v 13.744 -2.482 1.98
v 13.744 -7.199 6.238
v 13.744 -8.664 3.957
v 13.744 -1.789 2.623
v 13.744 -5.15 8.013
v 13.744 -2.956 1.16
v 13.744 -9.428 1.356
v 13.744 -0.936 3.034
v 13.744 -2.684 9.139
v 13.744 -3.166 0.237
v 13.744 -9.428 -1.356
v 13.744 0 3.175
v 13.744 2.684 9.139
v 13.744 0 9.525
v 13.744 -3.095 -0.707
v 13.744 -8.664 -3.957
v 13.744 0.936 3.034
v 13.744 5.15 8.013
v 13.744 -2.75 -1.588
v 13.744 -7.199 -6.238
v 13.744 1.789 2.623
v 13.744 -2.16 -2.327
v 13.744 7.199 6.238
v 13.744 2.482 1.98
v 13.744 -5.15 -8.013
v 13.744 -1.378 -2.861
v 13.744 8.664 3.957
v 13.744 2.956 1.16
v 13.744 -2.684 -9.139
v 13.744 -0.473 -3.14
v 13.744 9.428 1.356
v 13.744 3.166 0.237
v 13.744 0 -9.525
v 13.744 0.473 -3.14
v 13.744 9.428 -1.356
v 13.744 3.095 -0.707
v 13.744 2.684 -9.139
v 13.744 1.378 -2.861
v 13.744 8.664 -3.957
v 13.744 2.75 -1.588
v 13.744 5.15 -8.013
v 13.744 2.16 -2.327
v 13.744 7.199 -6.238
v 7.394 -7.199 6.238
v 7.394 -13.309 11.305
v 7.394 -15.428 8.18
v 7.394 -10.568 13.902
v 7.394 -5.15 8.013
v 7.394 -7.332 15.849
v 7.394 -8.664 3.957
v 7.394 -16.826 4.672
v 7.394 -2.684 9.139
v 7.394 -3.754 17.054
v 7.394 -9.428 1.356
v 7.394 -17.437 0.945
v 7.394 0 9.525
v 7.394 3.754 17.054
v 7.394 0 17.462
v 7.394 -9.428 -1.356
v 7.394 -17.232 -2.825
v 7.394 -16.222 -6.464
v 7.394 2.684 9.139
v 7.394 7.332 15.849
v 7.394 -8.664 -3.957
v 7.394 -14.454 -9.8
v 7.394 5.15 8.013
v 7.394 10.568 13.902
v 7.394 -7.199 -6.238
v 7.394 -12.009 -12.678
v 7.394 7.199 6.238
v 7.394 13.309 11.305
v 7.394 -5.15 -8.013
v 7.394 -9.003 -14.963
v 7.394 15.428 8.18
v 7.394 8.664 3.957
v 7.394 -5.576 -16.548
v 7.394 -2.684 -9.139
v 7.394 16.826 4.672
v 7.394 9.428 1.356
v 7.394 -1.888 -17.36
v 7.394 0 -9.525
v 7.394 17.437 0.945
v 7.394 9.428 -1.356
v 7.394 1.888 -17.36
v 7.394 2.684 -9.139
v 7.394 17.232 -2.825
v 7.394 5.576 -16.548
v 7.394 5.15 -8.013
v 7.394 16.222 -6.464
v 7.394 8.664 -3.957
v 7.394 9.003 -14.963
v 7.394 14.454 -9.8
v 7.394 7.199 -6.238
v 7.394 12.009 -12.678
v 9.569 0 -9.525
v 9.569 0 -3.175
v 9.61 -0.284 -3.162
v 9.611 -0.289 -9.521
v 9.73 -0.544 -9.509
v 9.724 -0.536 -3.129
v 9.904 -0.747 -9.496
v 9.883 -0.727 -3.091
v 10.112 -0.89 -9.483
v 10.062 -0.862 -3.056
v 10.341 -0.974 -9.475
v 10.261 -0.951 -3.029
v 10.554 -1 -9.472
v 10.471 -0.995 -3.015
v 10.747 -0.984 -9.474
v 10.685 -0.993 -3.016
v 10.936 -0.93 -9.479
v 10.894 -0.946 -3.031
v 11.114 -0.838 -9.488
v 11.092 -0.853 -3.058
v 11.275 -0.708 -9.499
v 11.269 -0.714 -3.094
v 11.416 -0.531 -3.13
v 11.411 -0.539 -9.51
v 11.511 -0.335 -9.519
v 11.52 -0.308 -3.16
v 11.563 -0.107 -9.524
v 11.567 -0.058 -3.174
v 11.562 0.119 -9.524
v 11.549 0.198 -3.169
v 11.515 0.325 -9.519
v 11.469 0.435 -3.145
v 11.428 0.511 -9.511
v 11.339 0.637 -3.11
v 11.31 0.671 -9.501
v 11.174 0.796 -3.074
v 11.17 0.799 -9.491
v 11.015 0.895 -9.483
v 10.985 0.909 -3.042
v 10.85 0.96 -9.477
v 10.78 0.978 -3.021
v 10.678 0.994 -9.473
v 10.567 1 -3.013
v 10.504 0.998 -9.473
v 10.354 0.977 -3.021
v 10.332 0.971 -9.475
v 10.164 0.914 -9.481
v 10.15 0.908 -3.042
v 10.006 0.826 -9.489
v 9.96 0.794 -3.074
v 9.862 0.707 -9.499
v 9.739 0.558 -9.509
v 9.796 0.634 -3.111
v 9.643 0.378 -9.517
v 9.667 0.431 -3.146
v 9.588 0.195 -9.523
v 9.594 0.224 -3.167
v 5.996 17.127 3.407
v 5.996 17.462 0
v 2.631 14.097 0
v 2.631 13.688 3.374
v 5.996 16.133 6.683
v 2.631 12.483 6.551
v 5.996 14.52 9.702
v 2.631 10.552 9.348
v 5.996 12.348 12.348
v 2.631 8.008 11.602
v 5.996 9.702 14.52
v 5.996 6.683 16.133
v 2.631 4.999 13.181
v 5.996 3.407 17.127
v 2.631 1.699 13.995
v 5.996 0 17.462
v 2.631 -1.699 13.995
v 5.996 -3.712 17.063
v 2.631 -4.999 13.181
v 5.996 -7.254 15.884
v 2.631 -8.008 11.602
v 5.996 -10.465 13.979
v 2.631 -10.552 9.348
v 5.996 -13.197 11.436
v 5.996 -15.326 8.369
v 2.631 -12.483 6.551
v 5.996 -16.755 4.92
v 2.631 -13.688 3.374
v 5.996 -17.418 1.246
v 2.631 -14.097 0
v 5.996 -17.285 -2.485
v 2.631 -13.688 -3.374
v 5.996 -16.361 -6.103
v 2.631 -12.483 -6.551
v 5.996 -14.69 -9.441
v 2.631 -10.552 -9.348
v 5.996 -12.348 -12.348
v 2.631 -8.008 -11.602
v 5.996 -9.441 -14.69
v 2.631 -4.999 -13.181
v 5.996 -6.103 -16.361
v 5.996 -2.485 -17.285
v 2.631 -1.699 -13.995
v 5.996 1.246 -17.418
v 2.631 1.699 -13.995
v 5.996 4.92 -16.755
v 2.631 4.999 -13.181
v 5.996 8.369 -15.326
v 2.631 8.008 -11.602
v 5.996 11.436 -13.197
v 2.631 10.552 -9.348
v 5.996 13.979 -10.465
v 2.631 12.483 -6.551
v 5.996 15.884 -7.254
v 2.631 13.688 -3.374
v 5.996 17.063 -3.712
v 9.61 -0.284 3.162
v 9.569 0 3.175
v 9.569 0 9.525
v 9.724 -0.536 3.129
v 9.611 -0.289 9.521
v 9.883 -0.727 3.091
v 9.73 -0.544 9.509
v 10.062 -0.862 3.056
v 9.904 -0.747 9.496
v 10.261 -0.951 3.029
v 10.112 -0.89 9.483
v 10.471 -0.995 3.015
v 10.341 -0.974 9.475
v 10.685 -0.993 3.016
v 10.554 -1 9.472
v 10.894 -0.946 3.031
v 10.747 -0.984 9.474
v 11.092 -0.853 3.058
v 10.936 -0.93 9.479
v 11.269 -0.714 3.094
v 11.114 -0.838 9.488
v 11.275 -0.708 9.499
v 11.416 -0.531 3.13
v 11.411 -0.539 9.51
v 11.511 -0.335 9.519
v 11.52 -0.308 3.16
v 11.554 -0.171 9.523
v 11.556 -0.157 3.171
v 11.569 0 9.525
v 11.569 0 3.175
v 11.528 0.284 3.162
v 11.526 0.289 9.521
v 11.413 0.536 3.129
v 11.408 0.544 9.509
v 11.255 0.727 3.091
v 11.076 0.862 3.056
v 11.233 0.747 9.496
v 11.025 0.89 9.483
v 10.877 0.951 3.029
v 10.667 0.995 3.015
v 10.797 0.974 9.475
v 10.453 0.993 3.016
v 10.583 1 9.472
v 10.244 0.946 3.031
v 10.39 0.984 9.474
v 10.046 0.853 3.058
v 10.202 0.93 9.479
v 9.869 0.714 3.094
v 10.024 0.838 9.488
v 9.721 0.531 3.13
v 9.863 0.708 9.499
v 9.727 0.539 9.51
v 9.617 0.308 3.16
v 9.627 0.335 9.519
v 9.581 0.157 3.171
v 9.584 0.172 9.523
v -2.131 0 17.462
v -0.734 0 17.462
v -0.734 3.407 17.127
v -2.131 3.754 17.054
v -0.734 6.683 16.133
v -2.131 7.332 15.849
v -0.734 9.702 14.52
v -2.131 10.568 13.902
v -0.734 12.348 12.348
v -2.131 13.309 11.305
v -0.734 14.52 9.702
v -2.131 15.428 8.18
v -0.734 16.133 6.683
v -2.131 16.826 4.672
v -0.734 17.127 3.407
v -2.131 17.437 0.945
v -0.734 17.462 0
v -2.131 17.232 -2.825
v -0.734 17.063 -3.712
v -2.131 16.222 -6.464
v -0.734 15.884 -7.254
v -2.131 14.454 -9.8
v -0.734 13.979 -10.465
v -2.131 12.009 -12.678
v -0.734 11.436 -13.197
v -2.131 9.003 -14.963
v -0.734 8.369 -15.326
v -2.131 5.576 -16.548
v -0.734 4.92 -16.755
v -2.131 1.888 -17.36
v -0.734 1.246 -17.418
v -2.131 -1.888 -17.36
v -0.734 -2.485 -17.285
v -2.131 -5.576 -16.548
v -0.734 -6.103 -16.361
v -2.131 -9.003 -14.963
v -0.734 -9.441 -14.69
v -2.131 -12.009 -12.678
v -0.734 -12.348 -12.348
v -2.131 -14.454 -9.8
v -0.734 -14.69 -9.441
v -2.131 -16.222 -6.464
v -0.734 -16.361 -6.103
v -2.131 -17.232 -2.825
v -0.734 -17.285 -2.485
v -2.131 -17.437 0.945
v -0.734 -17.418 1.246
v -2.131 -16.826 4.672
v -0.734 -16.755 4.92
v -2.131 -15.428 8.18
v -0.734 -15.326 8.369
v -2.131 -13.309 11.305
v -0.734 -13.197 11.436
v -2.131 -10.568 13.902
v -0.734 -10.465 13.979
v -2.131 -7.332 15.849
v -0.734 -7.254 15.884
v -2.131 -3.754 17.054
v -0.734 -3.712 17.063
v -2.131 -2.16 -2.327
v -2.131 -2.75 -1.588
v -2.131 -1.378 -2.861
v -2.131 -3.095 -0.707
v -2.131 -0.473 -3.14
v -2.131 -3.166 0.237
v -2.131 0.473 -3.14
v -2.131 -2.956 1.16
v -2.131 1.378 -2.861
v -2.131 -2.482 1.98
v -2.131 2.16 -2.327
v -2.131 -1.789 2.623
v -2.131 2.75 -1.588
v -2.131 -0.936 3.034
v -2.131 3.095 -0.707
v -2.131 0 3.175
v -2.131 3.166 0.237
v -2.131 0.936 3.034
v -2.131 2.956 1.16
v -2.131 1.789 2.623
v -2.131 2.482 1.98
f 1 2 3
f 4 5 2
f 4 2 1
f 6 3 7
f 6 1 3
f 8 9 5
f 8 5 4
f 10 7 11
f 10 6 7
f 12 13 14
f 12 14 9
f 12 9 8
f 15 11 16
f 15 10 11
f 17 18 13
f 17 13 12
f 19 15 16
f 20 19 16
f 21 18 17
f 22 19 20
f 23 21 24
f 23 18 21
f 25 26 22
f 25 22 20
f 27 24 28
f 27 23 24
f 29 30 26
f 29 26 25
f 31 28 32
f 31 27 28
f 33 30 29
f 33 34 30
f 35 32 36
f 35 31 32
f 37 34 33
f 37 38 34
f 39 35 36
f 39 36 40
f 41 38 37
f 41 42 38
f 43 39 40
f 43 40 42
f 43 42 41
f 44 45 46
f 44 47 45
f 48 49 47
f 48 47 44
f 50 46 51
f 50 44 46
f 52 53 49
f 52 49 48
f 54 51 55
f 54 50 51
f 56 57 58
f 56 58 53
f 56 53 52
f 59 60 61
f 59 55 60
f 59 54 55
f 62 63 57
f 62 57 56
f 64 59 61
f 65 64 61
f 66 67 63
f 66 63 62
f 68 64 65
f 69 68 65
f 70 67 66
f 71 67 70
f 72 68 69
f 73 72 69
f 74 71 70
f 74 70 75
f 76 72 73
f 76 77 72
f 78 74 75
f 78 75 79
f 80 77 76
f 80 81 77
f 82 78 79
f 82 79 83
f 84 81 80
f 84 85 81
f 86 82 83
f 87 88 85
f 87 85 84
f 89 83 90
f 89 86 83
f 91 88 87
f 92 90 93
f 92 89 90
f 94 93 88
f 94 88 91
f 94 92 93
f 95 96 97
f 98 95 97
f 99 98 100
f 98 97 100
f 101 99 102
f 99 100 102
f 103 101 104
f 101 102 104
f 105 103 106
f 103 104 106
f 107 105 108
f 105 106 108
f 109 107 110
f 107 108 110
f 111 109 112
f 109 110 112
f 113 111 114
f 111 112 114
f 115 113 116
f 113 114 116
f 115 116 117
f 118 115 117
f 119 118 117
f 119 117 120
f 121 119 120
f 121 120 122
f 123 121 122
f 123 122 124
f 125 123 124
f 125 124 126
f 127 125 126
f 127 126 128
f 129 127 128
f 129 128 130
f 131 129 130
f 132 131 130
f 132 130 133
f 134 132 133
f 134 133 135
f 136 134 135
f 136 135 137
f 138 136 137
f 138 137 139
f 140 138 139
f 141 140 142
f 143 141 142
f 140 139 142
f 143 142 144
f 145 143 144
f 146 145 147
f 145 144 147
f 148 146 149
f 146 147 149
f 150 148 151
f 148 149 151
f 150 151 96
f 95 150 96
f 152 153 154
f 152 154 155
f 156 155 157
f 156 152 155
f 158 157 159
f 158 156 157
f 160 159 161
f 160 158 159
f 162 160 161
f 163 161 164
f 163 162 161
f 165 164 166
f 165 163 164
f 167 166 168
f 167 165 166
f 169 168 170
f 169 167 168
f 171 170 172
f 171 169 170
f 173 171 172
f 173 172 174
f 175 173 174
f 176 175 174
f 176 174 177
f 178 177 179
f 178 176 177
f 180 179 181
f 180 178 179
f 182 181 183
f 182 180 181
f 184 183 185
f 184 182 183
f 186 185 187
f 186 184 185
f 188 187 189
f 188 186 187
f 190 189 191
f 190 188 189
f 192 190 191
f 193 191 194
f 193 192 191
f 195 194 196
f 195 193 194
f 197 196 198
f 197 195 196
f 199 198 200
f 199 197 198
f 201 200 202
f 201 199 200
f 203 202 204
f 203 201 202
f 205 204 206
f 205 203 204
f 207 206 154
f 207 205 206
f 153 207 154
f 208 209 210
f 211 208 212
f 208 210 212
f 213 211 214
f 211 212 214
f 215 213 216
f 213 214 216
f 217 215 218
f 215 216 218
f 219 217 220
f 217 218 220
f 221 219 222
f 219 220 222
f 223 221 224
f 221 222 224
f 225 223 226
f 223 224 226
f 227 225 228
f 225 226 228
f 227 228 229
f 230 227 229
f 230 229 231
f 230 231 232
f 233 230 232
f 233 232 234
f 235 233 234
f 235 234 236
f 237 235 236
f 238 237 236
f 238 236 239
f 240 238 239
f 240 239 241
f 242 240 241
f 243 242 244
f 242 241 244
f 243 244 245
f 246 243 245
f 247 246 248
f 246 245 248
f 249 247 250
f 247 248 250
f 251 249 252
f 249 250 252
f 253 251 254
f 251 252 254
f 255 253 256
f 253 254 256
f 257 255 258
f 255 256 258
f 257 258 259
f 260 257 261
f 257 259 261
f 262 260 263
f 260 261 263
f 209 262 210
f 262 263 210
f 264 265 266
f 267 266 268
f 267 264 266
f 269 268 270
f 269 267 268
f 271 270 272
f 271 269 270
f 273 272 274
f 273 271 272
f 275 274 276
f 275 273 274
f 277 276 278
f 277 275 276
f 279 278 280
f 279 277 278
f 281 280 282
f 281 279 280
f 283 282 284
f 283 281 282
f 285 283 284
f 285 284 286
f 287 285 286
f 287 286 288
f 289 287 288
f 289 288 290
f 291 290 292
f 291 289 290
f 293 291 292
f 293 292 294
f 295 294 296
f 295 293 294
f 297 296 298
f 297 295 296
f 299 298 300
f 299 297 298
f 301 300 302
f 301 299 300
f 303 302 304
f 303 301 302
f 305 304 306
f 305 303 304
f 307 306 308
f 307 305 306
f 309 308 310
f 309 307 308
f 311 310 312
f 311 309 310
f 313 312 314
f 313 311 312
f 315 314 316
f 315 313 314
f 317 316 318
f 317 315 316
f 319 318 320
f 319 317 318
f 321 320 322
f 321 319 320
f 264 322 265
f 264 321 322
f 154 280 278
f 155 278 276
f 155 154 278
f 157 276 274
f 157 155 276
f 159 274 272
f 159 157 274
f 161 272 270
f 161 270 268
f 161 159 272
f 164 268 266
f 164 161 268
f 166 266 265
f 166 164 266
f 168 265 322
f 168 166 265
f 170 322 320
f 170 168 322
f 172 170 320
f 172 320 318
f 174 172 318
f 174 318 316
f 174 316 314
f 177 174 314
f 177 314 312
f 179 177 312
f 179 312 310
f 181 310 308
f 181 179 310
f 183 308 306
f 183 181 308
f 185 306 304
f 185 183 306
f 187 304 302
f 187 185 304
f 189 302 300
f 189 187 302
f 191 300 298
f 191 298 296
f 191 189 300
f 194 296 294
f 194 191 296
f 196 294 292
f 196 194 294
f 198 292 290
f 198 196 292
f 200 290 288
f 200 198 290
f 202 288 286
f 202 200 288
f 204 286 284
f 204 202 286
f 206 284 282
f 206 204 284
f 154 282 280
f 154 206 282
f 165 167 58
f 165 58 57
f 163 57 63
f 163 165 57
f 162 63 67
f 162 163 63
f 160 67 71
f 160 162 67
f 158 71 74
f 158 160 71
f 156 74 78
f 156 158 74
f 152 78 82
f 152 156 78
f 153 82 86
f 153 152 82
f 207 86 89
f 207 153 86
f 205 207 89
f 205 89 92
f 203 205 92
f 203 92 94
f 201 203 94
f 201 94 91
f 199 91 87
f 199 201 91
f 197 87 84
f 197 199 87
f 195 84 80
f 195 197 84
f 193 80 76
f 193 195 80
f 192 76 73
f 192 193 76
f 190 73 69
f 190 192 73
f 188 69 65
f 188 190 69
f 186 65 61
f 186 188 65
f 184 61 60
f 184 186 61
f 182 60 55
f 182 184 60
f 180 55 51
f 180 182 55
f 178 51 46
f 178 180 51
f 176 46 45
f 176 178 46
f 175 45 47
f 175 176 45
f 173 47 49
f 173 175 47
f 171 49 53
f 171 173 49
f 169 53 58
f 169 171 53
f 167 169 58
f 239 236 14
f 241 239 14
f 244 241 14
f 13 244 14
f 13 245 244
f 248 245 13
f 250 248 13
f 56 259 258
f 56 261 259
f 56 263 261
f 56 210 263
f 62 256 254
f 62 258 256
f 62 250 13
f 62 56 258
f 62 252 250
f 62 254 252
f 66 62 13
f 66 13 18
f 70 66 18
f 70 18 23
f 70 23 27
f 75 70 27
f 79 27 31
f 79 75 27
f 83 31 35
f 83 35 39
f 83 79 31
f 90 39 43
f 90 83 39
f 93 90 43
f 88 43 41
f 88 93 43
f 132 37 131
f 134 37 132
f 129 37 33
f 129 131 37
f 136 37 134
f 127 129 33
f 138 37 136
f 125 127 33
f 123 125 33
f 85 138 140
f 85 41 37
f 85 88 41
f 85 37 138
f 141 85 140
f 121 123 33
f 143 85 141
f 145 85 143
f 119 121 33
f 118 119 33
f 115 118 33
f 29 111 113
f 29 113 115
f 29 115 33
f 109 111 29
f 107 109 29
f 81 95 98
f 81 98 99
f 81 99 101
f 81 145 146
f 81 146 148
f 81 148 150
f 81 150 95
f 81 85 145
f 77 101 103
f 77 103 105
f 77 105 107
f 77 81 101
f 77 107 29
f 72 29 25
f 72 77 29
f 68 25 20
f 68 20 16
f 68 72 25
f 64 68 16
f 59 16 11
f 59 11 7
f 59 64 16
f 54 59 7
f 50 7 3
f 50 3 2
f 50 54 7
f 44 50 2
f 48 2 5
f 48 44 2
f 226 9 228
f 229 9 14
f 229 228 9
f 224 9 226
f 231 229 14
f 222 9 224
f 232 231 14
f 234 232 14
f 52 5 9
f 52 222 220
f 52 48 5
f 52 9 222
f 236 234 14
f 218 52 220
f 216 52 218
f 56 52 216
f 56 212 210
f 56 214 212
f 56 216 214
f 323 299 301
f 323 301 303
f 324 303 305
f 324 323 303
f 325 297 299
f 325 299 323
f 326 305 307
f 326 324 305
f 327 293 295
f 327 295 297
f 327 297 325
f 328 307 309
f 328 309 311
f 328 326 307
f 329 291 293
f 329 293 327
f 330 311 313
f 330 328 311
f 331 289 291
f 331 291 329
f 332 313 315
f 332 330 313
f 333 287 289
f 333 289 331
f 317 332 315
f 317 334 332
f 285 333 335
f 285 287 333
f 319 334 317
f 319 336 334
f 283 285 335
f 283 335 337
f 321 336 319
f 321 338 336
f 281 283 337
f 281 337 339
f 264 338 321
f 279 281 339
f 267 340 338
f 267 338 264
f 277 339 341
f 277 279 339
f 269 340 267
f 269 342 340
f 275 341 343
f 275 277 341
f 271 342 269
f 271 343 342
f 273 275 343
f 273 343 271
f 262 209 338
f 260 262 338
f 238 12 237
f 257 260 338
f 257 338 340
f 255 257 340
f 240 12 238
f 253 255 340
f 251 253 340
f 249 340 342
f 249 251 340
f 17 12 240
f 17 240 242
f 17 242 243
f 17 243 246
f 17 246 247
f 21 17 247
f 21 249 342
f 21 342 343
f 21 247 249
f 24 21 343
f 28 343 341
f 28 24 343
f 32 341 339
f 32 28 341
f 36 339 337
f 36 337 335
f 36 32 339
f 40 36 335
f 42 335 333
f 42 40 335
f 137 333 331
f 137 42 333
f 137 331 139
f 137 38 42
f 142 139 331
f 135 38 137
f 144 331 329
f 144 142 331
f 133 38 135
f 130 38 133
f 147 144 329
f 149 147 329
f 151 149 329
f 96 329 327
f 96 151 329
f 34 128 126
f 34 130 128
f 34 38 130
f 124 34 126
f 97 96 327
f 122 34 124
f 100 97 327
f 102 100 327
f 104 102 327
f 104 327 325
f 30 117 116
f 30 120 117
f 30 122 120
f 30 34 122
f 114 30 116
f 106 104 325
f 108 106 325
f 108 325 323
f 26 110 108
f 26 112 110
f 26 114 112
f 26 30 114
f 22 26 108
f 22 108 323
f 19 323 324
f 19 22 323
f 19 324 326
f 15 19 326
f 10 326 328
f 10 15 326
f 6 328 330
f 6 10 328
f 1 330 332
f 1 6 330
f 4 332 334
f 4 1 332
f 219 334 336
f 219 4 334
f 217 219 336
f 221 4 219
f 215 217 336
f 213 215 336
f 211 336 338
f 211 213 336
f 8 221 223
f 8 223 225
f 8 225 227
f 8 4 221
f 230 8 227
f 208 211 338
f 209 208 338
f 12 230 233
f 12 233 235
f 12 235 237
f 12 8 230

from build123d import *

# Parameters (mm, degrees)
F4_DEPTH = 27.0135


with BuildPart() as f1:
    # F0 (on Front) → F1 (revolve)
    with BuildSketch(Plane.XZ):
        Polygon((-2.131164, 3.175), (13.743836, 3.175), (13.743836, 9.525), (7.393836, 9.525), (7.393836, 17.4625), (-2.131164, 17.4625), align=None)
    revolve(axis=Axis((-0.144044, 0, 0), (-1, 0, 0)))

    # F3 (on offset) → F4 (cut, through all)
    with BuildSketch(Plane.XY.offset(9.55)):
        with BuildLine():
            Line((9.568836, 0), (11.568836, 0))
            ThreePointArc((11.568836, 0), (10.568836, 1), (9.568836, 0))
        make_face()
        with BuildLine():
            ThreePointArc((9.568836, 0), (10.568836, -1), (11.568836, 0))
            Line((11.568836, 0), (9.568836, 0))
        make_face()
    extrude(amount=-F4_DEPTH, mode=Mode.SUBTRACT)

    # F6 (on Top) → F7 (revolve, cut)
    with BuildSketch(Plane.XY):
        Polygon((5.996475, 17.4625), (-0.733803, 17.4625), (2.631336, 14.097361), align=None)
    revolve(axis=Axis((5.807324, 0, 0), (1, 0, 0)), mode=Mode.SUBTRACT)


solid = f1.part
